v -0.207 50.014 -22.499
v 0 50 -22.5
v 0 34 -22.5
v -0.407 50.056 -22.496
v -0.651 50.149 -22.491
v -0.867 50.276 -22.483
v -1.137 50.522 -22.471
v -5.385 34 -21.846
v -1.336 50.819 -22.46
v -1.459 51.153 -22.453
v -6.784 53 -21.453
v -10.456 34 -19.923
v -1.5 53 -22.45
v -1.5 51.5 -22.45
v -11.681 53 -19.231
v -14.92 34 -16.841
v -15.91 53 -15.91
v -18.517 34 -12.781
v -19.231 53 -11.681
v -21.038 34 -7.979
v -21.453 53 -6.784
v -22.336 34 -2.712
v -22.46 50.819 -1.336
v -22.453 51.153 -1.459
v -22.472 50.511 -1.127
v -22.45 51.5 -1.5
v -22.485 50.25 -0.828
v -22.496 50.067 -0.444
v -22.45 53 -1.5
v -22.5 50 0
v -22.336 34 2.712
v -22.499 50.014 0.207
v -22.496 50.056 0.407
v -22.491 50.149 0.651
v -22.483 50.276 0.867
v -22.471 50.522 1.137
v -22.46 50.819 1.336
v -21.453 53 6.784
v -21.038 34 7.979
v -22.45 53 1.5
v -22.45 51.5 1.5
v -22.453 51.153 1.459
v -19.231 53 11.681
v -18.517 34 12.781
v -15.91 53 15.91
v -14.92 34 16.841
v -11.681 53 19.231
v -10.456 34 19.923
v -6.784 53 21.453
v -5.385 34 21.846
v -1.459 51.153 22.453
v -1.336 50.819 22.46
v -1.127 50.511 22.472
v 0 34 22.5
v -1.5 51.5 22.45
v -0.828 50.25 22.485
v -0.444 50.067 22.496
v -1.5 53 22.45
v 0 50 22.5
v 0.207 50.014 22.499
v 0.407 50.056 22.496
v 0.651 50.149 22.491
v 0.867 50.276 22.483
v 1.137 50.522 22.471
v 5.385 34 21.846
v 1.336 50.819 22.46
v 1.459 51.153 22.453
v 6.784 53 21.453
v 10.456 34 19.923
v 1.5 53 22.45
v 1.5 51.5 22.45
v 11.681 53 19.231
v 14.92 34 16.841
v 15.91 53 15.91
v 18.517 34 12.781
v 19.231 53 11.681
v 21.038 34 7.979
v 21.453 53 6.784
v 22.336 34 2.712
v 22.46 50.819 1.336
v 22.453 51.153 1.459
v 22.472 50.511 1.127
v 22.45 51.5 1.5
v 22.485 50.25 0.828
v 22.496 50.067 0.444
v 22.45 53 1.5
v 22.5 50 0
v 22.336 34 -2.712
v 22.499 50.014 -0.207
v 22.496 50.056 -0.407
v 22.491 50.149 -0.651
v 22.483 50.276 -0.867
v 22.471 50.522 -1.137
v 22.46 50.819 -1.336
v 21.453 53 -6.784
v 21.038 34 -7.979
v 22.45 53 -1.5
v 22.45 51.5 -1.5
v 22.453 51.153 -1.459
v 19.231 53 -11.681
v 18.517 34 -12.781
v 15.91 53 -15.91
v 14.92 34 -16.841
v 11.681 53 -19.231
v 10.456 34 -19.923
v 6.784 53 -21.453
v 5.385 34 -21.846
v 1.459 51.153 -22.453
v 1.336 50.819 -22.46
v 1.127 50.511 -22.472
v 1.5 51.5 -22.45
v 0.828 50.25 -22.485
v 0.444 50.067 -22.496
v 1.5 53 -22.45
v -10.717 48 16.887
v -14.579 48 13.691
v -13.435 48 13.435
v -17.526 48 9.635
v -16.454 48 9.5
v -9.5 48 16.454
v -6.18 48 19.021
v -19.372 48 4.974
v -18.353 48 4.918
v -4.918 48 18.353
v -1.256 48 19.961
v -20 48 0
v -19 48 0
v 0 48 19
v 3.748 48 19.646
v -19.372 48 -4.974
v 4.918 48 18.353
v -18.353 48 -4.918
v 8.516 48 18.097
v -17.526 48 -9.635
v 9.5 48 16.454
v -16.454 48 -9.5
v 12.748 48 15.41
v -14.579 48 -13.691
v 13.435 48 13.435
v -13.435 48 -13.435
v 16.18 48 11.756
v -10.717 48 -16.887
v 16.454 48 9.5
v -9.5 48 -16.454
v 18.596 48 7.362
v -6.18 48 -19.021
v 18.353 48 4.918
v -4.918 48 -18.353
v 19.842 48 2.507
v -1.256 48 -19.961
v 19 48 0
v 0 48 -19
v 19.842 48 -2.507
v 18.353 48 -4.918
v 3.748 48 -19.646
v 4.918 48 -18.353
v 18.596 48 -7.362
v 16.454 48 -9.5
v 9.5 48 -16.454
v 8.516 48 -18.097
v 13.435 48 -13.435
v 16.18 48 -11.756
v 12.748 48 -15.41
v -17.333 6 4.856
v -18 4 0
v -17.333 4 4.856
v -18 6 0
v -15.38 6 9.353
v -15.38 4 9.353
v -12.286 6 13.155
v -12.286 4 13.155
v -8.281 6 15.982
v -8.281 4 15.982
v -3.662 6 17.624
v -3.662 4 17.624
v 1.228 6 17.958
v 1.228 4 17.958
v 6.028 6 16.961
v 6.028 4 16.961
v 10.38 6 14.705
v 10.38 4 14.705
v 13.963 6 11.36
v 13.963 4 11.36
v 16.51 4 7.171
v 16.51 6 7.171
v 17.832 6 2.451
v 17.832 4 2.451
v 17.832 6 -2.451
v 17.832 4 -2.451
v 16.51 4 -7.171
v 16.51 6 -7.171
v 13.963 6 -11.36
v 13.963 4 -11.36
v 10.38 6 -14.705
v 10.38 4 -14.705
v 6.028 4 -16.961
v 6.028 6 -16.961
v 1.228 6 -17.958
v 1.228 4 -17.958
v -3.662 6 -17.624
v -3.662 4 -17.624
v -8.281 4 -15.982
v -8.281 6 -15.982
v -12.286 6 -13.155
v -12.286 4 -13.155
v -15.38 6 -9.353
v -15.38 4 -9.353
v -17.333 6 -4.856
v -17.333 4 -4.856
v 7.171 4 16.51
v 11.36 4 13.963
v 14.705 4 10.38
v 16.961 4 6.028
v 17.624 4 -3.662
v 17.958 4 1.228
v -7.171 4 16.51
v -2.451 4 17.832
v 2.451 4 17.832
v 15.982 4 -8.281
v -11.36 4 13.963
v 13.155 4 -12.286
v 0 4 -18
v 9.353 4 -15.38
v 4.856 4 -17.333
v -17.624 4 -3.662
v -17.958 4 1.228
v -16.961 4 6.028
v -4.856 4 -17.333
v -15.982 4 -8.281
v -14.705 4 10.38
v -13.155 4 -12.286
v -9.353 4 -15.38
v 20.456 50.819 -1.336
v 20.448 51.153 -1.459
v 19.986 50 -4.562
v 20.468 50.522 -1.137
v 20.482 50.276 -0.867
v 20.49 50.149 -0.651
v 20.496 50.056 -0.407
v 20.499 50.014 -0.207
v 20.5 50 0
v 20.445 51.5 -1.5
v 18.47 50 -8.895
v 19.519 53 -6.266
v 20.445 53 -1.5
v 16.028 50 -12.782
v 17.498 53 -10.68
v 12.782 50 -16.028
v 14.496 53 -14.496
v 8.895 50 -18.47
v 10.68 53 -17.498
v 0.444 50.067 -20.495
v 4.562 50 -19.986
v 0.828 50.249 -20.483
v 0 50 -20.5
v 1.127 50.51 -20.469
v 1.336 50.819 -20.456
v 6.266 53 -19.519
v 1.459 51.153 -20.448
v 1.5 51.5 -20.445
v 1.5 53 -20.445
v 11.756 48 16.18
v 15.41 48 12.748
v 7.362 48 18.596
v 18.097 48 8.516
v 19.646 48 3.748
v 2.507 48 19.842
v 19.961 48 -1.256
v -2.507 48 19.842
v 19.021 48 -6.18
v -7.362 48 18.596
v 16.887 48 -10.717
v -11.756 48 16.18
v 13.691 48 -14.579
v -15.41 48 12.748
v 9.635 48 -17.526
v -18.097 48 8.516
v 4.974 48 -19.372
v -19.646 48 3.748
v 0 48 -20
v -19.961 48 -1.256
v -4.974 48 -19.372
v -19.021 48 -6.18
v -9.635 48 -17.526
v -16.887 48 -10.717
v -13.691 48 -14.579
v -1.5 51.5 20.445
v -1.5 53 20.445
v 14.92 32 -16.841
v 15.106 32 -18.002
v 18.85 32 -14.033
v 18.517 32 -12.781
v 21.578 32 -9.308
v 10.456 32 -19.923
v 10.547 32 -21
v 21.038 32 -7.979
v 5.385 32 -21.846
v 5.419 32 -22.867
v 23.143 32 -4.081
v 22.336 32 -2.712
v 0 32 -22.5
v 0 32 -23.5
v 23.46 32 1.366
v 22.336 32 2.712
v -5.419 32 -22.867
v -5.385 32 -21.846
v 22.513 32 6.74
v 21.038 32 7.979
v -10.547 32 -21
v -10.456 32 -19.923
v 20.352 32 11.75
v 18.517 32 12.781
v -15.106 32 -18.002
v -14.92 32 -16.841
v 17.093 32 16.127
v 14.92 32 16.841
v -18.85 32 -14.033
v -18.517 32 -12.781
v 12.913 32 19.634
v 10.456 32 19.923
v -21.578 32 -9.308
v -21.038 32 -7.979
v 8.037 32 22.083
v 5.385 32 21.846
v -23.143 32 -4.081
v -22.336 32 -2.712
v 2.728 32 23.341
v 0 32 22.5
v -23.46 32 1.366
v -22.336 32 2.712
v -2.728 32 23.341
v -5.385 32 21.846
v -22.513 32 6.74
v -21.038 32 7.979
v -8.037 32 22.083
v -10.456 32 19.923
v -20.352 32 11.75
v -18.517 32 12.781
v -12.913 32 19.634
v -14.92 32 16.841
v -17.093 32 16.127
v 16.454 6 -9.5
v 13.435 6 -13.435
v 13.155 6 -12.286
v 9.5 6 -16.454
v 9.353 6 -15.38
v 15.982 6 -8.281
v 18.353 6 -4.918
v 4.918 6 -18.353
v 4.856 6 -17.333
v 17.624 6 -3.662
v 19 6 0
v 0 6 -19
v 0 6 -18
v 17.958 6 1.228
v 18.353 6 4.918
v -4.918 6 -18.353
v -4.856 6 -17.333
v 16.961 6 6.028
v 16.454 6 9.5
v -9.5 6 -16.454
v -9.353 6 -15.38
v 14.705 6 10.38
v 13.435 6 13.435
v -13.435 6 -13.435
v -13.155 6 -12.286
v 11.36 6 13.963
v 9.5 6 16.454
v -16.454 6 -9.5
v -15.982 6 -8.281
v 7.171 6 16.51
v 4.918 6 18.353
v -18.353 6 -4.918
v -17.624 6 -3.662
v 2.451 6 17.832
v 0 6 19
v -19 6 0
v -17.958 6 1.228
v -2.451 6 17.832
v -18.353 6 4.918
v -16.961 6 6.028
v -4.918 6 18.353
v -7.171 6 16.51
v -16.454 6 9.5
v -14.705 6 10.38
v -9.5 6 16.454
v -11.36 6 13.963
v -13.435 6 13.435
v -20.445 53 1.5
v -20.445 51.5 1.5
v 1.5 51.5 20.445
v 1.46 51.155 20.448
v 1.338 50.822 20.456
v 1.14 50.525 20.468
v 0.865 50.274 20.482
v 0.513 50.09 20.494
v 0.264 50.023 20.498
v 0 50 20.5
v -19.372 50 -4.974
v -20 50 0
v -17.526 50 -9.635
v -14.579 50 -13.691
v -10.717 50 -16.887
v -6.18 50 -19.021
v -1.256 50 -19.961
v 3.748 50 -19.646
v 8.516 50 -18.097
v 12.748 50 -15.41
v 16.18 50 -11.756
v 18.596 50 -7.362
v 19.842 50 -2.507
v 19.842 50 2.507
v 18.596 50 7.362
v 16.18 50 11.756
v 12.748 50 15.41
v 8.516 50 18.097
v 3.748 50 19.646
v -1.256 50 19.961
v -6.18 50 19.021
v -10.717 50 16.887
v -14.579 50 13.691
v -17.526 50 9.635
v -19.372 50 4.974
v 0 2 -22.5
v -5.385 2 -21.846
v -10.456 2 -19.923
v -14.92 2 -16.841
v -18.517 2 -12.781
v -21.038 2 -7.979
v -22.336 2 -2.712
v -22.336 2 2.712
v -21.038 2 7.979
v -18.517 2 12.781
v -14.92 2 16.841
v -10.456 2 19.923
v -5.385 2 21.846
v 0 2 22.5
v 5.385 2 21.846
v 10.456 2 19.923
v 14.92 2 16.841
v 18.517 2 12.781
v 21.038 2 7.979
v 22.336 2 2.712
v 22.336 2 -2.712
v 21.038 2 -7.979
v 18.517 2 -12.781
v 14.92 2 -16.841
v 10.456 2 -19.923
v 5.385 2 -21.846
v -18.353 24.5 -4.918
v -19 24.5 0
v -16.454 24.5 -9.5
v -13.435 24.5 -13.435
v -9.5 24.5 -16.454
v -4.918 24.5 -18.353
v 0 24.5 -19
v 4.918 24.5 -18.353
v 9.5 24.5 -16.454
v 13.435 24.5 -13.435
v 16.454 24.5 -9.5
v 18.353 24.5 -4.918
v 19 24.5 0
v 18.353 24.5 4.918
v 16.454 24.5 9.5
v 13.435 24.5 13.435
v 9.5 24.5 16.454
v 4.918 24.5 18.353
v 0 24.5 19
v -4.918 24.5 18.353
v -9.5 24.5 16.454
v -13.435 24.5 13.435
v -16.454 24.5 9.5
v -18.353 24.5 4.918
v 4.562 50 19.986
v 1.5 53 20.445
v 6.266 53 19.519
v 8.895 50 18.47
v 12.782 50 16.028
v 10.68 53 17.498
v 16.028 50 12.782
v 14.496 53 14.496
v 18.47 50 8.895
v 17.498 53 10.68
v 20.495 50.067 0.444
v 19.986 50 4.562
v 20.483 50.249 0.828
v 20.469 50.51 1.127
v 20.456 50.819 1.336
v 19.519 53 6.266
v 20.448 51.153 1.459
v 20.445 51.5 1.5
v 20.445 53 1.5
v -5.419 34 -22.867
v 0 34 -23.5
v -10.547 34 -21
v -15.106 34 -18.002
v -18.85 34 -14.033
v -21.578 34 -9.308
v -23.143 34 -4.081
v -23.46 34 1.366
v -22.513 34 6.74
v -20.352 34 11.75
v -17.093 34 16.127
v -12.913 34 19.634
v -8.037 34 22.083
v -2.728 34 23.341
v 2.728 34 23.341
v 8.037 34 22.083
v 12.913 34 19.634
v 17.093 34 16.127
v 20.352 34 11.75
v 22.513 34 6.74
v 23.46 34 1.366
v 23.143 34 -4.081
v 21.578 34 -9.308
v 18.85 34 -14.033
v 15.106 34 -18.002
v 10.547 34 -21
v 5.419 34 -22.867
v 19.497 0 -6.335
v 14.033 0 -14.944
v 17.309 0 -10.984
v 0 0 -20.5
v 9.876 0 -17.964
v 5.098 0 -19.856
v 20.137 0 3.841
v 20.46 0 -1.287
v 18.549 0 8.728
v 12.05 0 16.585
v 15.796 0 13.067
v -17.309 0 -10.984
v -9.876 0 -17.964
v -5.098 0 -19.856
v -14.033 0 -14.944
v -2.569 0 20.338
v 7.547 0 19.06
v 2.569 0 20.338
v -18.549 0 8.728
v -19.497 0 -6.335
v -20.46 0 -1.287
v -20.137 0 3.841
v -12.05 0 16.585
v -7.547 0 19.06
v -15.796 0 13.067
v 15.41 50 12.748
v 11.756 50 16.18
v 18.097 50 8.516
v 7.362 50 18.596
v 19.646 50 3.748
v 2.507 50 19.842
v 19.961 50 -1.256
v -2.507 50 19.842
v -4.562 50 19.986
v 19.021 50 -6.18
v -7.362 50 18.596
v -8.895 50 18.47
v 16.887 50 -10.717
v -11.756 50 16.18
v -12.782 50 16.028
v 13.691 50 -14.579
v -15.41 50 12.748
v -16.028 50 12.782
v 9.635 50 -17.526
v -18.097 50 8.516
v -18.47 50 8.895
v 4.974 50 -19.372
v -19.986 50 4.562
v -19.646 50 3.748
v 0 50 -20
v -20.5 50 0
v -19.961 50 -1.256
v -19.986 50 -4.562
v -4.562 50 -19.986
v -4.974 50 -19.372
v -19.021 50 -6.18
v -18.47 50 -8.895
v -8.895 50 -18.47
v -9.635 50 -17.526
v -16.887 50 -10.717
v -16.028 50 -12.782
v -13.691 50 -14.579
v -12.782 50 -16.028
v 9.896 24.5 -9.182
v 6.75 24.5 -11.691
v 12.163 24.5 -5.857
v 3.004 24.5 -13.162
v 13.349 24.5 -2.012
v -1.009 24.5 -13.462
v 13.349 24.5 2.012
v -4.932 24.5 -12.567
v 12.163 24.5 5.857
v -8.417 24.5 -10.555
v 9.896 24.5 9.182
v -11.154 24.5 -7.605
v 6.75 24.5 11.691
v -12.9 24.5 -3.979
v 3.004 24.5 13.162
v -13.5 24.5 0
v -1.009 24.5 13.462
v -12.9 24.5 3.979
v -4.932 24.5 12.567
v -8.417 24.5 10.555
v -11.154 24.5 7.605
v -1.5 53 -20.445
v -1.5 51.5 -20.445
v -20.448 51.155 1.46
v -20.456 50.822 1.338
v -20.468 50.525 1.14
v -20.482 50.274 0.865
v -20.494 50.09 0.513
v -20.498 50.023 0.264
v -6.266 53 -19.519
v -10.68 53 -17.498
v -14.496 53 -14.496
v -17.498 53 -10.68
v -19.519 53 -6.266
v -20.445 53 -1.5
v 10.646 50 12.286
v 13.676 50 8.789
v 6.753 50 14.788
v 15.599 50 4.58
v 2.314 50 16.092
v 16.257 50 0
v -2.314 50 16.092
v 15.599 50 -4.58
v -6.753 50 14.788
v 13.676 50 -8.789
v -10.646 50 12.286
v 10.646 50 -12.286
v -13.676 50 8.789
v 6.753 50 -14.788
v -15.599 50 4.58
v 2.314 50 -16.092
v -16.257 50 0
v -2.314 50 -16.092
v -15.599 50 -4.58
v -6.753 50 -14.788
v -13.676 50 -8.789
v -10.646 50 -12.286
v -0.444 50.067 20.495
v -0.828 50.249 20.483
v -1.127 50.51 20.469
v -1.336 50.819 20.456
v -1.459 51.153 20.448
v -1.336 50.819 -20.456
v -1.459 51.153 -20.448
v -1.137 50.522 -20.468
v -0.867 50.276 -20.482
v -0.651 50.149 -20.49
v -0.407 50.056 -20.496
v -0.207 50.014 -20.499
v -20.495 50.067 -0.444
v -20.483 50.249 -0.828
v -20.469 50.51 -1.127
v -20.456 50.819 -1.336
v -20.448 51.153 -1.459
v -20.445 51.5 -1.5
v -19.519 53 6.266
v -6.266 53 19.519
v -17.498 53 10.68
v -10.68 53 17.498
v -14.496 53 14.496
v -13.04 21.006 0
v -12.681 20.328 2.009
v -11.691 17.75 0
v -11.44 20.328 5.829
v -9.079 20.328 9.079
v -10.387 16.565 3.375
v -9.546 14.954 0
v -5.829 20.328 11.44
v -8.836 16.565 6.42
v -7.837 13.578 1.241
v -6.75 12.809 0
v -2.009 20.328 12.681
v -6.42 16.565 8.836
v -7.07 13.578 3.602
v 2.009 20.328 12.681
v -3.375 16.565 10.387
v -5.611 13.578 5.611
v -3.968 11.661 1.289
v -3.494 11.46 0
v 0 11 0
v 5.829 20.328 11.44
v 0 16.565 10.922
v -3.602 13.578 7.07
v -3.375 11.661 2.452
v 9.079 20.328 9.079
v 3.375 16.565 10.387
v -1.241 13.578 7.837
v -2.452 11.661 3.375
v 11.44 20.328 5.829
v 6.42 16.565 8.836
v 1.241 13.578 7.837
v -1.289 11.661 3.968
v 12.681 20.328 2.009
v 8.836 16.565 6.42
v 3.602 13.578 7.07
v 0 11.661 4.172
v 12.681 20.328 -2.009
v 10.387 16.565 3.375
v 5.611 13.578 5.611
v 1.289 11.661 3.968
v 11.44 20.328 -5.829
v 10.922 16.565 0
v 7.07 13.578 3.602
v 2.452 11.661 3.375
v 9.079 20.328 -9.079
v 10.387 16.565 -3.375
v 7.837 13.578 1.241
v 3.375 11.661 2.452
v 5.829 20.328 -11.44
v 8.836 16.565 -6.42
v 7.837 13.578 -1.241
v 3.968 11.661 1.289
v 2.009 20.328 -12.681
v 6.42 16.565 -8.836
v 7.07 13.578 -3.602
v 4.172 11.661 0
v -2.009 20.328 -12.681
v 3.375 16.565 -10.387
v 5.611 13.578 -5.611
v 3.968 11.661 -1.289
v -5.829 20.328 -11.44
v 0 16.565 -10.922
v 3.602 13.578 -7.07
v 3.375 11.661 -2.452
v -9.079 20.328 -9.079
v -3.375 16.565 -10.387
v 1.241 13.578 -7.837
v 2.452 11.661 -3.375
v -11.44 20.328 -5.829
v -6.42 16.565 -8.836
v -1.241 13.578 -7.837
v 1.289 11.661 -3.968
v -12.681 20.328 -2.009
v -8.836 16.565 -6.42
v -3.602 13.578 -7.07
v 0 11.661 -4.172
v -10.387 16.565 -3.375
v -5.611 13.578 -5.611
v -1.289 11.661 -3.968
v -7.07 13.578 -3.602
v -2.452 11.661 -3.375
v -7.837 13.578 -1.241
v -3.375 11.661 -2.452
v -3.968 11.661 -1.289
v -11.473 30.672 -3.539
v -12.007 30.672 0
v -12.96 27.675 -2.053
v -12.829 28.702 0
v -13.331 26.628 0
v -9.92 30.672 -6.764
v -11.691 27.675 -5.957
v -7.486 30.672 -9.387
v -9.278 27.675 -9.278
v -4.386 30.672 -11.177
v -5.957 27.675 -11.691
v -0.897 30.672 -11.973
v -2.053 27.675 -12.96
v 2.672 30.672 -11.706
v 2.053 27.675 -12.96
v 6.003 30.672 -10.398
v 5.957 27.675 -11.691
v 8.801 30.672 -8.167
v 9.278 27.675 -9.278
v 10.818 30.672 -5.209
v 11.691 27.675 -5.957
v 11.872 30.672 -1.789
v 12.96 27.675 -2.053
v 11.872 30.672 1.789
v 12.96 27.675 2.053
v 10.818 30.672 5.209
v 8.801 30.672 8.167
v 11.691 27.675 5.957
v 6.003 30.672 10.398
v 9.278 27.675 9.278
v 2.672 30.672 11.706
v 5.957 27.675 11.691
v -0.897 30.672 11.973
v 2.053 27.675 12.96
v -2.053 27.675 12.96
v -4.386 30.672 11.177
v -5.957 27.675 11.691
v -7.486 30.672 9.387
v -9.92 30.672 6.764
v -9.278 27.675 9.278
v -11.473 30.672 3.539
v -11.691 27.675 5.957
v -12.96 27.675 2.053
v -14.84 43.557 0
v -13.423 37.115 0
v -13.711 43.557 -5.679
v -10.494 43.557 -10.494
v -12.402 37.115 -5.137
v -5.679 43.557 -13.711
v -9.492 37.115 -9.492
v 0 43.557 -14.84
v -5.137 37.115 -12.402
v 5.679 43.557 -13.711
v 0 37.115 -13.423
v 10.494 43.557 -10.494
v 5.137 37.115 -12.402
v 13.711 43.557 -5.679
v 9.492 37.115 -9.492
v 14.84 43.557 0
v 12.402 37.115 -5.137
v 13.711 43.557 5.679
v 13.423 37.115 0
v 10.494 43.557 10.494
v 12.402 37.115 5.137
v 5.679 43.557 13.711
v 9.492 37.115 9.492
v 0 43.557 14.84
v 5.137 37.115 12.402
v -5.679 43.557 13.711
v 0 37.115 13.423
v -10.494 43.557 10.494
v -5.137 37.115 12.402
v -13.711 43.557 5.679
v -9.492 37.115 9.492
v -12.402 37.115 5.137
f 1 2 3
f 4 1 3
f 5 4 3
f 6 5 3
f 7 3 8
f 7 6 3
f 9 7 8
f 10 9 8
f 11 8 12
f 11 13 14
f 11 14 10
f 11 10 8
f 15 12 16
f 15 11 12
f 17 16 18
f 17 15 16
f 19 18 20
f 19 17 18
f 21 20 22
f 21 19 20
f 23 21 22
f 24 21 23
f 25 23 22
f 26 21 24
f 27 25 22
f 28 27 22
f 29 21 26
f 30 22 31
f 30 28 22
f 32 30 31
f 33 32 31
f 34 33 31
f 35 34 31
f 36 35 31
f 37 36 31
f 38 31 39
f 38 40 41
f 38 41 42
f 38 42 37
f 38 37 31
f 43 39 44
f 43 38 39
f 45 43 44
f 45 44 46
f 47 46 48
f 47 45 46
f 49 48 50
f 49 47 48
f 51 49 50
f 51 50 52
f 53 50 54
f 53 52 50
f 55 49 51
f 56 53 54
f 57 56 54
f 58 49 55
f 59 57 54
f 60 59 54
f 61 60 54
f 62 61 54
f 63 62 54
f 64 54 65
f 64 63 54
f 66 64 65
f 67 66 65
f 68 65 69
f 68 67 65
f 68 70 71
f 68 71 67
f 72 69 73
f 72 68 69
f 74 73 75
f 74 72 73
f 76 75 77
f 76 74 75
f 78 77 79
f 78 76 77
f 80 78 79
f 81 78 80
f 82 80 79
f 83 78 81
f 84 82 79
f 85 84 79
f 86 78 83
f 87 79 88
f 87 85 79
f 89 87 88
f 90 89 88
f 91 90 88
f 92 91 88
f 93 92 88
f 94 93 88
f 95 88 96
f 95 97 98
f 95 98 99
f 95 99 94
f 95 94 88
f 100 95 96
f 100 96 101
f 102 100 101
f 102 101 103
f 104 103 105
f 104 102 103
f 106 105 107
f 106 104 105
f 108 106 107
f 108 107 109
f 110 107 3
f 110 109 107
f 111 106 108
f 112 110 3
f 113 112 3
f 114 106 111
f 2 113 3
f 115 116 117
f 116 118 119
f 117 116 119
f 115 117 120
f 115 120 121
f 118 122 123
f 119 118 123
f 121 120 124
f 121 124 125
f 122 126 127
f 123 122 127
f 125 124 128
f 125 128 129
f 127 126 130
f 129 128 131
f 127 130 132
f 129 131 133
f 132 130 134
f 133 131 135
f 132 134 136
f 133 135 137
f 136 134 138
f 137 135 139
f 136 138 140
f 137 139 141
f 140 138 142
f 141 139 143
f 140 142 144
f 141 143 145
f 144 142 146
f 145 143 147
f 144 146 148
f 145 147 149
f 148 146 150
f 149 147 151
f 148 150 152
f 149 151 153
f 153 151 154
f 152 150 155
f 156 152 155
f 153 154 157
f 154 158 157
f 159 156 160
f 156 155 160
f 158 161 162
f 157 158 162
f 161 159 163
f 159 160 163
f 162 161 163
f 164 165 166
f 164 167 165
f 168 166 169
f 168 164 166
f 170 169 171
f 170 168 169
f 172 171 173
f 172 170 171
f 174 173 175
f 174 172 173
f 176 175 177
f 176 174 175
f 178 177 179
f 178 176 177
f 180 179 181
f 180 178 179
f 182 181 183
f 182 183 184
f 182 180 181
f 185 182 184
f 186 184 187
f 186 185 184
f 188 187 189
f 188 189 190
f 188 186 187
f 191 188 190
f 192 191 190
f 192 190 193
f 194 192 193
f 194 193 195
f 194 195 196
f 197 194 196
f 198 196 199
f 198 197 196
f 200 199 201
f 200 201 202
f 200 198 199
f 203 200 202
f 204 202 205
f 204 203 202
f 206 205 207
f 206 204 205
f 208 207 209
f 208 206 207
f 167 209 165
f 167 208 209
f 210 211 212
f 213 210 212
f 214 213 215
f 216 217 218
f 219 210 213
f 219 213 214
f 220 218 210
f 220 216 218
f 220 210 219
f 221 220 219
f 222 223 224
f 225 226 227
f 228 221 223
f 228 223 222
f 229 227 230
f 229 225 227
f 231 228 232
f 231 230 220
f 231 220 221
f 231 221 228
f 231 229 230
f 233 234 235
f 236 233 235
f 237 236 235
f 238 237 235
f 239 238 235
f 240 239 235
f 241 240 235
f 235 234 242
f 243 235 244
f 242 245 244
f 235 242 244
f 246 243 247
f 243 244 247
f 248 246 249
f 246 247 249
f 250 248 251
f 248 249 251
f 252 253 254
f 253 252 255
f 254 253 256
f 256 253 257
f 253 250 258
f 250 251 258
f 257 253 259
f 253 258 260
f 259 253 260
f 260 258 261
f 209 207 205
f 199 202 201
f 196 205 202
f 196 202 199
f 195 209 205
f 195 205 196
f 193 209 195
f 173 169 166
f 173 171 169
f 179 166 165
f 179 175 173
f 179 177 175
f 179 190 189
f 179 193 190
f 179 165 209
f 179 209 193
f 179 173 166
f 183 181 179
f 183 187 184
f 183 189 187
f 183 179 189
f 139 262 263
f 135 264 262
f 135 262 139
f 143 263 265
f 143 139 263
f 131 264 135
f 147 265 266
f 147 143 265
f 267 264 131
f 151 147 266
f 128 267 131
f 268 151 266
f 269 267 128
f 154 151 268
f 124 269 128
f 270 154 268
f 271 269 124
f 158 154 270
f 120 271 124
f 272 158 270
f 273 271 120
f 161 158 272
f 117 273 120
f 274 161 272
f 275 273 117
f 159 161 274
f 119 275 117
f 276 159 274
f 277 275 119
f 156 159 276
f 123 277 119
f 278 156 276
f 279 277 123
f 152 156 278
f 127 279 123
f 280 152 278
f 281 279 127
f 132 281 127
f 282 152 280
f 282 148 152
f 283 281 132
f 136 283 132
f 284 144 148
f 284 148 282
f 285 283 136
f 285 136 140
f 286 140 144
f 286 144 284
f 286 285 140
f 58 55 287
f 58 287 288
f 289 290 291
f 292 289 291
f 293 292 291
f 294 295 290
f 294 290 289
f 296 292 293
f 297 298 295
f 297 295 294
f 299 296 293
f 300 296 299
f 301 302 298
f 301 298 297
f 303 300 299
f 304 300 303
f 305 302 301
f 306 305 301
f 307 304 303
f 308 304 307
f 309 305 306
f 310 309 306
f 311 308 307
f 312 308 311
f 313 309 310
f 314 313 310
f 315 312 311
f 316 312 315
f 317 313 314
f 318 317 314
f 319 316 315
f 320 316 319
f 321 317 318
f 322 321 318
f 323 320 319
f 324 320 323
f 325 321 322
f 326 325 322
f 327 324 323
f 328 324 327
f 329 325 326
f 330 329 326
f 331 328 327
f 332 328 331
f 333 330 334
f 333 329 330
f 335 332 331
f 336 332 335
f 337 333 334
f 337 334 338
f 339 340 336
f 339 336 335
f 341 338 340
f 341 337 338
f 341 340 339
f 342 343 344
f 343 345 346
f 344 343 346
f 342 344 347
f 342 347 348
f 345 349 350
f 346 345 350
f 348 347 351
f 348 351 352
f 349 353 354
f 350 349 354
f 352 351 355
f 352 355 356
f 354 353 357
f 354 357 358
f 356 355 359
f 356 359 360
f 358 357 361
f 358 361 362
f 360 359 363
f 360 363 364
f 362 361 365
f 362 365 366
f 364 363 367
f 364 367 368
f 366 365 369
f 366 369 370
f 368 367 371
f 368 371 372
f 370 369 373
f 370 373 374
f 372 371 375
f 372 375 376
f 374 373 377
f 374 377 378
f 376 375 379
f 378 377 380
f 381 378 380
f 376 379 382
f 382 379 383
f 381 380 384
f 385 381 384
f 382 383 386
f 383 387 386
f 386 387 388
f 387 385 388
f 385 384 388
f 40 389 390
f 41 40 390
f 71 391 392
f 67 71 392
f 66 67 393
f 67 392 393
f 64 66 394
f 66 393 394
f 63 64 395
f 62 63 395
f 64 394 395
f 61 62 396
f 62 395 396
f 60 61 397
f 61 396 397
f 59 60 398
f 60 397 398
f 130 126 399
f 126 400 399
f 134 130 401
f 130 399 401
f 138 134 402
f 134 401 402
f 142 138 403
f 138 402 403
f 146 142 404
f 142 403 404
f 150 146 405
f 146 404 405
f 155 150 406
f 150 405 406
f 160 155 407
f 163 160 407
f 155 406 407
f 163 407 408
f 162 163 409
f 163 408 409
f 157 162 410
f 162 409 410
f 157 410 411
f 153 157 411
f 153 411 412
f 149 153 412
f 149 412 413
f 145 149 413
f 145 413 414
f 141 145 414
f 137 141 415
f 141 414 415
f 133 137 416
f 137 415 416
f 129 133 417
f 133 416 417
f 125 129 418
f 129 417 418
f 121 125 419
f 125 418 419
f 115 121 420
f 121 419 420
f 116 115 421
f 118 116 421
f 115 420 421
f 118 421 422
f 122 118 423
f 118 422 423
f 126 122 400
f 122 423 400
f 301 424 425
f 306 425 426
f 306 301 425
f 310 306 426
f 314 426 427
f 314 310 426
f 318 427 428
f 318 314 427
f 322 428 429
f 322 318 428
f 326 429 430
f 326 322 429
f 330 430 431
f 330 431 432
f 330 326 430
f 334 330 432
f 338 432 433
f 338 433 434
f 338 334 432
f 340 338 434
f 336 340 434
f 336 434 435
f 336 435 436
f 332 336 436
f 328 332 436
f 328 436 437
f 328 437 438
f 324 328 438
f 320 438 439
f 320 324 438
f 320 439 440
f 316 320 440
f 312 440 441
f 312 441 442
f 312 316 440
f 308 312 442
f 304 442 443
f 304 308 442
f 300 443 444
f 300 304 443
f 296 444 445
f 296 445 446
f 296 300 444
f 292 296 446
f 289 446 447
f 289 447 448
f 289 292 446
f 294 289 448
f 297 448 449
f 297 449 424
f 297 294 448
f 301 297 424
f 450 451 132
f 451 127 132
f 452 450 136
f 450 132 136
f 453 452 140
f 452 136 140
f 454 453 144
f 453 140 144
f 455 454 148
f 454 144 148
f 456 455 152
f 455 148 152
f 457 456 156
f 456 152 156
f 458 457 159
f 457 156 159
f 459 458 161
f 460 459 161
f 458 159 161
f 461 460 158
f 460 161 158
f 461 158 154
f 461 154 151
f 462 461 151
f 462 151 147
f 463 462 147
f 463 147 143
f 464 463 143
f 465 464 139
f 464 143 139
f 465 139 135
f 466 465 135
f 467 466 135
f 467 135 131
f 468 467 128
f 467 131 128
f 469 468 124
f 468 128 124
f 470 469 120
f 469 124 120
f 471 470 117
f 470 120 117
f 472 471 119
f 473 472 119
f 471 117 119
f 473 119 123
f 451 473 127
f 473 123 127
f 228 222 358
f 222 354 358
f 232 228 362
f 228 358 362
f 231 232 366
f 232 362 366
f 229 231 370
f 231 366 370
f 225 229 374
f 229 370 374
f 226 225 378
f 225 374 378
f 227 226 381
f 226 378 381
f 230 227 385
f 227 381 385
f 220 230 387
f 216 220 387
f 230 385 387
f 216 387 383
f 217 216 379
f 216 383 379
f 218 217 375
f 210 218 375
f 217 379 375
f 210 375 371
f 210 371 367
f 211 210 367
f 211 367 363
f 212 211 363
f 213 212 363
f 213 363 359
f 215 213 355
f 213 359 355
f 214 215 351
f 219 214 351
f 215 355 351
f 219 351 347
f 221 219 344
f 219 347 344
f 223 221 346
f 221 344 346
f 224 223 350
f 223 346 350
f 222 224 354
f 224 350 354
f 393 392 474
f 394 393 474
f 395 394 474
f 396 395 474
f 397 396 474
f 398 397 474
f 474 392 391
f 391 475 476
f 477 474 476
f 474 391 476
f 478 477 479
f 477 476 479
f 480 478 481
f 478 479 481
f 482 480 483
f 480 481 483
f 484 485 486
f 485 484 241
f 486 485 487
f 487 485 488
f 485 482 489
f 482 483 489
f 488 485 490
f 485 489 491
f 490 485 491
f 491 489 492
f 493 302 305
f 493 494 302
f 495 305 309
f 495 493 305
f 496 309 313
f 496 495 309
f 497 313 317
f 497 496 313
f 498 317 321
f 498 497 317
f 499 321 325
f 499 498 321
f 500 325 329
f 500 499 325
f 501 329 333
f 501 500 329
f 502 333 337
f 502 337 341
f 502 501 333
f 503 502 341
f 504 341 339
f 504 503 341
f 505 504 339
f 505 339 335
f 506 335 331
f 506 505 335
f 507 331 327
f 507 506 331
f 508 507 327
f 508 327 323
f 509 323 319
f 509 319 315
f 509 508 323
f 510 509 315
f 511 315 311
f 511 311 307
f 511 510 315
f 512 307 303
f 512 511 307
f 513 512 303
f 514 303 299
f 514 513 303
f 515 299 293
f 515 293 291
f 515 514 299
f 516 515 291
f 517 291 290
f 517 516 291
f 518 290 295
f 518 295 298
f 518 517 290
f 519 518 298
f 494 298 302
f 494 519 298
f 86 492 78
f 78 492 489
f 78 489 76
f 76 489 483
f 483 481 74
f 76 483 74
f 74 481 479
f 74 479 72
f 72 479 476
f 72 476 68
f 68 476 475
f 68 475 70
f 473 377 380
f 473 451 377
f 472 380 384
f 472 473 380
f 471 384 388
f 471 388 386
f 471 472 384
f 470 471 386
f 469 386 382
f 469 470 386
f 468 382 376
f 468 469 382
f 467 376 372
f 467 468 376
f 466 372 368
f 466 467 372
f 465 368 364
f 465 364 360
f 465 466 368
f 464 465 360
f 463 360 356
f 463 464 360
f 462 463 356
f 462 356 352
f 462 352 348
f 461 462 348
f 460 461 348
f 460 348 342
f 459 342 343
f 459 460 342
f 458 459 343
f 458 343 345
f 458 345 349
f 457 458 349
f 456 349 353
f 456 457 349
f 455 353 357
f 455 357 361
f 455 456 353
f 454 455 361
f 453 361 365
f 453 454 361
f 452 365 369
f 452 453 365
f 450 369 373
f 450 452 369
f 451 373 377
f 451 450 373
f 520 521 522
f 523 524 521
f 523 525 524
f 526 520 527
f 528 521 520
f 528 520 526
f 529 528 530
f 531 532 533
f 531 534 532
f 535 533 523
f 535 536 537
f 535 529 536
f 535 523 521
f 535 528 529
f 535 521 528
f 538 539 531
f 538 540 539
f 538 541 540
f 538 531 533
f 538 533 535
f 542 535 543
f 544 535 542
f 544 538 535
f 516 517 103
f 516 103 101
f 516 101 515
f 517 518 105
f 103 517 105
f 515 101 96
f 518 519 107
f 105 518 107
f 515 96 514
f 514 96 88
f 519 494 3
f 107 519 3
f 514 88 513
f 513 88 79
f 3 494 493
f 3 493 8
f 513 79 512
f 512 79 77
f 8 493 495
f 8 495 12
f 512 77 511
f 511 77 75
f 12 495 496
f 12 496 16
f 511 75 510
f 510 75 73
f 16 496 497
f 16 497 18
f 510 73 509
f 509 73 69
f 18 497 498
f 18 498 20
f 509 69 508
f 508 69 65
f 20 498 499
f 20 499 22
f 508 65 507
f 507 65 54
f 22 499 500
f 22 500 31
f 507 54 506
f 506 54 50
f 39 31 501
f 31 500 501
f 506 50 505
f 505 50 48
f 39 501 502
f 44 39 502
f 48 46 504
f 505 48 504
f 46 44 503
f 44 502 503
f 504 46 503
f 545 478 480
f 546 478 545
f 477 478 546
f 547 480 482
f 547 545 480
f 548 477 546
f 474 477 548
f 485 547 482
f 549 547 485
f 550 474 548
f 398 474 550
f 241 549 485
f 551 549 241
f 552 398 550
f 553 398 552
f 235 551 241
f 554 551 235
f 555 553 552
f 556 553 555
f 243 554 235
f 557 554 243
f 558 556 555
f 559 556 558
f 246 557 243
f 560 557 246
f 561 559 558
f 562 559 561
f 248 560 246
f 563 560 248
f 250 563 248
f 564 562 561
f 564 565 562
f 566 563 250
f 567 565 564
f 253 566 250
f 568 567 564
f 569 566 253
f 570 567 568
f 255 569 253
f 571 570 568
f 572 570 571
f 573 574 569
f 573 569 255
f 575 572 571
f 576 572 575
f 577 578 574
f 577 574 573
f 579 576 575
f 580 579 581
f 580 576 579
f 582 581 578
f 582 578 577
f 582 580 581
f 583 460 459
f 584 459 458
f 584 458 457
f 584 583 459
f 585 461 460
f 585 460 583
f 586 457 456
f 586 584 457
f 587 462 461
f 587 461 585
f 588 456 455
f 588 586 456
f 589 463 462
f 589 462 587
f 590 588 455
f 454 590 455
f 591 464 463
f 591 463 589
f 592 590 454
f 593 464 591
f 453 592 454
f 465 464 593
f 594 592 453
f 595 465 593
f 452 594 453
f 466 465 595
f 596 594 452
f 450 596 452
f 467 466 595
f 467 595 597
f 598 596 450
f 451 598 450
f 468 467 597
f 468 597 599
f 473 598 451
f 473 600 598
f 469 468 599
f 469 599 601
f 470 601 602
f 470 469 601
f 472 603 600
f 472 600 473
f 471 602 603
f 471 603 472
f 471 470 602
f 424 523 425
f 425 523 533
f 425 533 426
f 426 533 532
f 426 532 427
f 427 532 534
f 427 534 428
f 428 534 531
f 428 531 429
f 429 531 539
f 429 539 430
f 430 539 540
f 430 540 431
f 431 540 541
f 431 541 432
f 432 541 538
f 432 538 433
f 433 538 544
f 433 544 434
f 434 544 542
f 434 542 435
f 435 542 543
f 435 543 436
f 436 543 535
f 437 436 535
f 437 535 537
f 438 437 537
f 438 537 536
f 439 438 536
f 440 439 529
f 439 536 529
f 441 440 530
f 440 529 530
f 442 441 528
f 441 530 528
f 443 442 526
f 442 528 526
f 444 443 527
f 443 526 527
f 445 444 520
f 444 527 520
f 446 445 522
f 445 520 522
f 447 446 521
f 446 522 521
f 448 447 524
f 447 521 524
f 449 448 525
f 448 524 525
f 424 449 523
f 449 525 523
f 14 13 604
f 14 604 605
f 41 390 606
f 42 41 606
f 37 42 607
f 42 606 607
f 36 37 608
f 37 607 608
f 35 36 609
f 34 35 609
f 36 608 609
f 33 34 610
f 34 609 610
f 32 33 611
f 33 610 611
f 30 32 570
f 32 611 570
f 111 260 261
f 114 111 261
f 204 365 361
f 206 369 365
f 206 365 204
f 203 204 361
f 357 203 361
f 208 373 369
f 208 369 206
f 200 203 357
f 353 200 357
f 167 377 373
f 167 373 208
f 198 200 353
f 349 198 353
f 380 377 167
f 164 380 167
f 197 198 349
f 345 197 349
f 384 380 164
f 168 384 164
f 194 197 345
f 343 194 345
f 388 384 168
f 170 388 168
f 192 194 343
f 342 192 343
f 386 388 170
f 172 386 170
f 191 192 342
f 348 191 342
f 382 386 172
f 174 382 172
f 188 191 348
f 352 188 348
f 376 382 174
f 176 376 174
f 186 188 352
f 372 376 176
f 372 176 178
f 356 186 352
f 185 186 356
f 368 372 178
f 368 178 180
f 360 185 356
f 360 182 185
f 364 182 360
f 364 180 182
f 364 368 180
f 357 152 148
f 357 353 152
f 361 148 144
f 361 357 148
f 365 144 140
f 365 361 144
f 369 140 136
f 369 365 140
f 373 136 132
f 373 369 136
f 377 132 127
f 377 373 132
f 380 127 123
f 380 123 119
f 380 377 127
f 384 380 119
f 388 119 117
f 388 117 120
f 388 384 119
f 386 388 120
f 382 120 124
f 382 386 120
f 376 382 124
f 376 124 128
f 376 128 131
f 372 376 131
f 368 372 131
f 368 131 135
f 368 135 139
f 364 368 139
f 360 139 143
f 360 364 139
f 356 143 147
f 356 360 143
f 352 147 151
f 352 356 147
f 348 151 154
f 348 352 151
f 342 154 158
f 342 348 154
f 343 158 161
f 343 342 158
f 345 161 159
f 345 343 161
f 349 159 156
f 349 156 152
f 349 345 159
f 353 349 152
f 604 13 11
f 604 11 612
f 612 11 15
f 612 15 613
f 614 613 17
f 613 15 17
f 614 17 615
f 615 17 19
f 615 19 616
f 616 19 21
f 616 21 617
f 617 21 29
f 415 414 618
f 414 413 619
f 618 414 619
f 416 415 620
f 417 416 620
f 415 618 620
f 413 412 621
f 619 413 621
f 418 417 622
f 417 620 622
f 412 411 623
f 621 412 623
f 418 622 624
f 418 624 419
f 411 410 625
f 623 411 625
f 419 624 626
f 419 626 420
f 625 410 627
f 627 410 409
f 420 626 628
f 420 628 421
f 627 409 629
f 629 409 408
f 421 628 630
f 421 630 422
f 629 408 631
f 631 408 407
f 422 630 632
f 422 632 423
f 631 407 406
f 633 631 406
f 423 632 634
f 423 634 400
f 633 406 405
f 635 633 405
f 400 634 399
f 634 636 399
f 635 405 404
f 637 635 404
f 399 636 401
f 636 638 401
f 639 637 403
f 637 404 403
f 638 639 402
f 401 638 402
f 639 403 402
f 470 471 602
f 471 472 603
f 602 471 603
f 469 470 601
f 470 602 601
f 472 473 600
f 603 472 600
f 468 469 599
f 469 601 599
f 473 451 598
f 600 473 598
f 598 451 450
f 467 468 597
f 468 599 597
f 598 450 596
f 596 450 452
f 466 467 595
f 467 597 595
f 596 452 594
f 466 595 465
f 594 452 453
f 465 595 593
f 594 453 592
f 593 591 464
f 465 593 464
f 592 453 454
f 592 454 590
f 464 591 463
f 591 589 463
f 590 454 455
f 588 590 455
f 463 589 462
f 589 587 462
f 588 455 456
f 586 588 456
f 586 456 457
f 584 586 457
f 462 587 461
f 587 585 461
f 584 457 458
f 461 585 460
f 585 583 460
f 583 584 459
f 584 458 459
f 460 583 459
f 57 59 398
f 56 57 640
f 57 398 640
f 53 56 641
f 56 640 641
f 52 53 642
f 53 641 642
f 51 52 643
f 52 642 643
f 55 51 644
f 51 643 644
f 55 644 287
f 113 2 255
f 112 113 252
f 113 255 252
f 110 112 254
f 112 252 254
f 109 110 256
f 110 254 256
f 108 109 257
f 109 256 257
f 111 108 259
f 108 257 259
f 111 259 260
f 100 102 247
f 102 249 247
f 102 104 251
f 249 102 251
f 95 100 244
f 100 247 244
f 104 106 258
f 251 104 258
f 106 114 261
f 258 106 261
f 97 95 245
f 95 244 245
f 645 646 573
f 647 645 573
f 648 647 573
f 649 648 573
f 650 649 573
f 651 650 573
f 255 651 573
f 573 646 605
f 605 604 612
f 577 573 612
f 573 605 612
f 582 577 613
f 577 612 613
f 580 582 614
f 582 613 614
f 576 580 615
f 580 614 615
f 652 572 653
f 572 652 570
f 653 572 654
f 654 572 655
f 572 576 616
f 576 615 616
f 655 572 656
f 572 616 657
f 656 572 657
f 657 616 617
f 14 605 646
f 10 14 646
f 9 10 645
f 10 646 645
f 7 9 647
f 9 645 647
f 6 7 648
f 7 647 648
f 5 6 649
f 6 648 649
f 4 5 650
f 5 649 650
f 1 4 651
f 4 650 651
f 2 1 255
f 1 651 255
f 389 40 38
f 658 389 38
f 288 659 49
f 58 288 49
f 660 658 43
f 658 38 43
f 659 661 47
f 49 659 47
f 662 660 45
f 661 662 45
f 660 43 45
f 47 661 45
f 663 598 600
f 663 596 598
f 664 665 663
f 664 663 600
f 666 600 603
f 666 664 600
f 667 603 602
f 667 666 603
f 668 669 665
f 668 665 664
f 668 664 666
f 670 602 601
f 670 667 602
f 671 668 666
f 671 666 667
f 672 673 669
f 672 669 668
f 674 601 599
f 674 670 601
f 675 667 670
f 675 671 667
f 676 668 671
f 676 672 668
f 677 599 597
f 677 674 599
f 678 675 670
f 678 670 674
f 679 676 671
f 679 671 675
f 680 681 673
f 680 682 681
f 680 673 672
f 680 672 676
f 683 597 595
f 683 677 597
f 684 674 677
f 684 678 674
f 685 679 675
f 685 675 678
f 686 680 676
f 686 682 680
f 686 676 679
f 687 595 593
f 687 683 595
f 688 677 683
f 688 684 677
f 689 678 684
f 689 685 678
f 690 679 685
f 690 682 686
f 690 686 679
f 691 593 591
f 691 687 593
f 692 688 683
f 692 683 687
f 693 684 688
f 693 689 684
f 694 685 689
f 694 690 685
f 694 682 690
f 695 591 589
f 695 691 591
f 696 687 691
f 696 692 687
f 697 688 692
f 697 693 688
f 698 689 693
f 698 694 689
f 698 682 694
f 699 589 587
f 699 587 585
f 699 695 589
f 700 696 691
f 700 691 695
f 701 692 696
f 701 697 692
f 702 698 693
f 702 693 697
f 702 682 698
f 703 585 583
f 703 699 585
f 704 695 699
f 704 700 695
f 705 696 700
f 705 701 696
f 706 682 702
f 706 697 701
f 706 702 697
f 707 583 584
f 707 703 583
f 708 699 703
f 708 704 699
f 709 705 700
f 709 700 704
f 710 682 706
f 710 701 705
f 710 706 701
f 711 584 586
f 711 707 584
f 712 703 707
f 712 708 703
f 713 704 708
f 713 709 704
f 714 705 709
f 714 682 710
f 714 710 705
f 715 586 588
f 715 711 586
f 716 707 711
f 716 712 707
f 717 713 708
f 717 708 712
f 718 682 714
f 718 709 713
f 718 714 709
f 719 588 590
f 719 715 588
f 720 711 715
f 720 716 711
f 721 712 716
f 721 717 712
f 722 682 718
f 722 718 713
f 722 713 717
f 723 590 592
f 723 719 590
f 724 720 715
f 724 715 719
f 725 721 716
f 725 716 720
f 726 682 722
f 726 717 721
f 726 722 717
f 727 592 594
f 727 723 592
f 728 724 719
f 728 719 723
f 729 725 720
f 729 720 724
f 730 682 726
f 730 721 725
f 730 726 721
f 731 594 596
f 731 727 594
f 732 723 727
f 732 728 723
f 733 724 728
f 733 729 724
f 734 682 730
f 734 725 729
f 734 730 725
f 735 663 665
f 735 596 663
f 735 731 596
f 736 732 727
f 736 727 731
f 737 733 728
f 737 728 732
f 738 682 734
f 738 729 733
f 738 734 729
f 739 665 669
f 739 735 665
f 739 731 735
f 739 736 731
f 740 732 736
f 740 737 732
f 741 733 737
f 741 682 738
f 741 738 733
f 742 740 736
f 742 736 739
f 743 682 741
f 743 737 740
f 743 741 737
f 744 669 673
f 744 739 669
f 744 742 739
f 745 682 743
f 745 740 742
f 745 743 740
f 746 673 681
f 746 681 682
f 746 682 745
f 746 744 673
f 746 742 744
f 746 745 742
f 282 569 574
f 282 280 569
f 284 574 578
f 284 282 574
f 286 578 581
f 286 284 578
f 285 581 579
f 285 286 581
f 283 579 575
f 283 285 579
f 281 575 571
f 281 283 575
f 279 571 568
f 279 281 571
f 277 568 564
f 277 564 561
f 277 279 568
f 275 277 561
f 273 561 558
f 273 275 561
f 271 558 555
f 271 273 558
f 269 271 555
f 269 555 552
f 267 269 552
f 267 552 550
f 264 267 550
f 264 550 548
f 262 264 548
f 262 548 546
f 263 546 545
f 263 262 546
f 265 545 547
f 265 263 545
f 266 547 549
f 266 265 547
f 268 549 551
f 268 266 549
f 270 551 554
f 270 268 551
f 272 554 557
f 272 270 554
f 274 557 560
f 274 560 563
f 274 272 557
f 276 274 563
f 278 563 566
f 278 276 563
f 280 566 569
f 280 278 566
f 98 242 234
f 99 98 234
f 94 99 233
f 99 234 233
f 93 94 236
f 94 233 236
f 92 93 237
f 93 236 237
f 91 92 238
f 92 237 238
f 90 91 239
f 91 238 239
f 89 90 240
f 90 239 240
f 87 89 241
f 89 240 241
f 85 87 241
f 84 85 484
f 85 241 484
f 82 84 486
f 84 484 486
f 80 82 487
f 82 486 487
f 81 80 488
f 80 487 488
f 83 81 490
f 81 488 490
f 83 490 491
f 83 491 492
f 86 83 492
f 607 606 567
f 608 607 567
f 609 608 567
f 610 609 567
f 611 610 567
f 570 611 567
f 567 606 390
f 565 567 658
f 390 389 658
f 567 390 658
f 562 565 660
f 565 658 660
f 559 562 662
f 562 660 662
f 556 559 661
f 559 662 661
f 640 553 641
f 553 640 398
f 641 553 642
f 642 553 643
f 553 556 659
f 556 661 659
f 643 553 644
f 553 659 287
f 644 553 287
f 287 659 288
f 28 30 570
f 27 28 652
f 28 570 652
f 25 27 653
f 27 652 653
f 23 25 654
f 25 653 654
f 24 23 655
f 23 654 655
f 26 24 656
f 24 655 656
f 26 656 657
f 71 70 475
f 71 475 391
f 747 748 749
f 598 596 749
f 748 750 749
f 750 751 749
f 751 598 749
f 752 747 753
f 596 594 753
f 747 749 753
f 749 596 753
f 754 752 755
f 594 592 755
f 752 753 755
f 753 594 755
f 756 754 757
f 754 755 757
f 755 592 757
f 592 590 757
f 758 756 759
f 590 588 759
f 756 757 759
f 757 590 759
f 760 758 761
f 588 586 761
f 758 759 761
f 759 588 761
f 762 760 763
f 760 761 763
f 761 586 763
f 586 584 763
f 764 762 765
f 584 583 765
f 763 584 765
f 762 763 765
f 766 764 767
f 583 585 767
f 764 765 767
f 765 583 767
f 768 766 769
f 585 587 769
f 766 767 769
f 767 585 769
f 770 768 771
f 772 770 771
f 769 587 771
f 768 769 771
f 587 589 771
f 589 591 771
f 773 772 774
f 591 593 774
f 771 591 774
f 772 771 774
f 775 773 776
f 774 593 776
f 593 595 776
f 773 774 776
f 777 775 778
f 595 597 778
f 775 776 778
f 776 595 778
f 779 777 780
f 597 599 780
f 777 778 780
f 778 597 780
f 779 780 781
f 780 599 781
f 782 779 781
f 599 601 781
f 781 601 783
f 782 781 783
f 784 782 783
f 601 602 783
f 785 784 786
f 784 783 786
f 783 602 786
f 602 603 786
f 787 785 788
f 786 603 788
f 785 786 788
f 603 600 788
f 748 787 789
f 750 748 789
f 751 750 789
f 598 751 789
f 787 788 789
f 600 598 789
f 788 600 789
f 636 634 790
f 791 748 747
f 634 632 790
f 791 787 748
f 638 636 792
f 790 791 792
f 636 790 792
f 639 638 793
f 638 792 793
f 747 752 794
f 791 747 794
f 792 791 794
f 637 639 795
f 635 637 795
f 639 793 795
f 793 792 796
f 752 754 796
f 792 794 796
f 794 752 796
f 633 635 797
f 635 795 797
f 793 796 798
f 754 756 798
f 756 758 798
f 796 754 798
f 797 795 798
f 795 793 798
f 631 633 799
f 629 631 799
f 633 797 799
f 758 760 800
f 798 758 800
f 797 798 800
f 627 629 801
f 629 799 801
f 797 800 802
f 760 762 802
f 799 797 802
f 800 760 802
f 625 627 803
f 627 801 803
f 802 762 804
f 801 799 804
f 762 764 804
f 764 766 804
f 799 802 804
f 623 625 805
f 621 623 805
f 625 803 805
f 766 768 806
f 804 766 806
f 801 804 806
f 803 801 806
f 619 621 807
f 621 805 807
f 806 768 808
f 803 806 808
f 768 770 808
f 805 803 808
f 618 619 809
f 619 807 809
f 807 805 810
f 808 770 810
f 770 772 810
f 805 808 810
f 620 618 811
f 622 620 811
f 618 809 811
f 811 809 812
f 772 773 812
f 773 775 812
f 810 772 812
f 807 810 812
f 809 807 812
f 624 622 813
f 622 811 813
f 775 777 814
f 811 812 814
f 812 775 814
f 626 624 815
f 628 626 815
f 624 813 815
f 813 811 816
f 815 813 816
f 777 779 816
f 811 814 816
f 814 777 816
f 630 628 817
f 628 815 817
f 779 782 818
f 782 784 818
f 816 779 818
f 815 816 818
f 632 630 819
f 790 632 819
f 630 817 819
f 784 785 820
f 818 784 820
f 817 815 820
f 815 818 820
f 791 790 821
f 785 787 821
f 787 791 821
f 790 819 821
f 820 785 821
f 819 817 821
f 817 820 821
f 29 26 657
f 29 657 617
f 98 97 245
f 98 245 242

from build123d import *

# Parameters (mm, degrees)
SKETCH_1_W               = 1
SKETCH_1_H               = 2
SKETCH_1_W_2             = 2
SKETCH_1_H_2             = 3
CUT_EXTRUDE_1_REACH      = 64.558
CUT_EXTRUDE_1_END_RADIUS = 22.5
PATTERN_CIRCULAR_1_COUNT = 4
CHAMFER_1_SIZE           = 2


with BuildPart() as part:
    # 草图1 → Revolve 2266 (revolve)
    with BuildSketch(Plane.XY, mode=Mode.PRIVATE) as revolve_2266_sk:
        Polygon((19, 4), (0, 4), (0, 0), (22.5, 0), (22.5, 50), (20, 50), (20, 48), (19, 48), align=None)
        with Locations((18.5, 5)):
            Rectangle(SKETCH_1_W, SKETCH_1_H)
        with Locations((21.5, 51.5)):
            Rectangle(SKETCH_1_W_2, SKETCH_1_H_2)
        with Locations((23, 33)):
            Rectangle(SKETCH_1_W, SKETCH_1_H)
    revolve(revolve_2266_sk.sketch.rotate(Axis((0, 0, 0), (0, 1, 0)), 90), axis=Axis((0, 0, 0), (0, 1, 0)))

    # 切除-拉伸1: up to this cylinder (the profile starts inside it)
    cut_extrude_1_end = Plane(origin=(0, 51.640025, 0), z_dir=(0, -1, 0)) * Cylinder(CUT_EXTRUDE_1_END_RADIUS, 175.116, mode=Mode.PRIVATE)
    # 草图4 → 切除-拉伸1 (cut, up to the surface)
    with BuildSketch(Plane.XY, mode=Mode.PRIVATE) as cut_extrude_1_sk1:
        with BuildLine():
            Line((0, 50), (0, 53))
            Line((0, 53), (-1.5, 53))
            Line((-1.5, 53), (-1.5, 51.5))
            ThreePointArc((-1.5, 51.5), (-1.060660173, 50.439339829), (-3e-09, 50))
        make_face()
    cut_extrude_1_tool1 = extrude(cut_extrude_1_sk1.sketch, amount=-CUT_EXTRUDE_1_REACH, mode=Mode.PRIVATE) & cut_extrude_1_end
    # 草图4 → 切除-拉伸1 (cut, up to the surface)
    with BuildSketch(Plane.XY, mode=Mode.PRIVATE) as cut_extrude_1_sk2:
        with BuildLine():
            Line((1.5, 53), (0, 53))
            Line((0, 53), (0, 50))
            ThreePointArc((-3e-09, 50), (1.060660171, 50.439339827), (1.5, 51.5))
            Line((1.5, 51.5), (1.5, 53))
        make_face()
    cut_extrude_1_tool2 = extrude(cut_extrude_1_sk2.sketch, amount=-CUT_EXTRUDE_1_REACH, mode=Mode.PRIVATE) & cut_extrude_1_end
    cut_extrude_1 = cut_extrude_1_tool1.solids().sort_by_distance((-0.700124, 51.640025, 0))[0] + cut_extrude_1_tool2.solids().sort_by_distance((0.700124, 51.640025, 0))[0]
    add(cut_extrude_1, mode=Mode.SUBTRACT)

    # 阵列(圆周)1: 切除-拉伸1 ×4 about axis
    pattern_circular_1_axis = Axis((0, 0, 0), (0, 1, 0))
    for i in range(1, PATTERN_CIRCULAR_1_COUNT):
        add(cut_extrude_1.rotate(pattern_circular_1_axis, i * 360 / PATTERN_CIRCULAR_1_COUNT), mode=Mode.SUBTRACT)

    # 倒角1
    chamfer_1_edges = [part.edges().sort_by_distance(p)[0] for p in [
        (0, 0, 22.5),
    ]]
    chamfer(chamfer_1_edges, length=CHAMFER_1_SIZE)


with BuildPart() as body_2:
    # 草图2 → Revolve 2503 (revolve)
    with BuildSketch(Plane.XY, mode=Mode.PRIVATE) as revolve_2503_sk:
        with BuildLine():
            Line((19, 13), (19, 24.5))
            Line((19, 24.5), (13.5, 24.5))
            ThreePointArc((13.5, 24.5), (9.545941546, 14.954058454), (0, 11))
            Line((0, 11), (0, 4))
            Line((0, 4), (18, 4))
            Line((18, 4), (18, 6))
            Line((18, 6), (19, 6))
            Line((19, 6), (19, 13))
        make_face()
    revolve(revolve_2503_sk.sketch.rotate(Axis((0, 0, 0), (0, 1, 0)), 180), axis=Axis((0, 0, 0), (0, 1, 0)))


with BuildPart() as body_3:
    # 草图3 → Revolve 2701 (revolve)
    with BuildSketch(Plane.XY, mode=Mode.PRIVATE) as revolve_2701_sk:
        with BuildLine():
            Line((19, 48), (20, 48))
            Line((20, 48), (20, 50))
            Line((20, 50), (16.257063968, 50))
            Line((16.257063968, 50), (12.006534401, 30.671963356))
            ThreePointArc((12.006534401, 30.671963356), (13.121322617, 27.675042172), (13.5, 24.5))
            Line((13.5, 24.5), (19, 24.5))
            Line((19, 24.5), (19, 48))
        make_face()
    revolve(revolve_2701_sk.sketch.rotate(Axis((0, 50, 0), (0, -1, 0)), 180), axis=Axis((0, 50, 0), (0, -1, 0)))


solid = Compound([part.part, body_2.part, body_3.part])
